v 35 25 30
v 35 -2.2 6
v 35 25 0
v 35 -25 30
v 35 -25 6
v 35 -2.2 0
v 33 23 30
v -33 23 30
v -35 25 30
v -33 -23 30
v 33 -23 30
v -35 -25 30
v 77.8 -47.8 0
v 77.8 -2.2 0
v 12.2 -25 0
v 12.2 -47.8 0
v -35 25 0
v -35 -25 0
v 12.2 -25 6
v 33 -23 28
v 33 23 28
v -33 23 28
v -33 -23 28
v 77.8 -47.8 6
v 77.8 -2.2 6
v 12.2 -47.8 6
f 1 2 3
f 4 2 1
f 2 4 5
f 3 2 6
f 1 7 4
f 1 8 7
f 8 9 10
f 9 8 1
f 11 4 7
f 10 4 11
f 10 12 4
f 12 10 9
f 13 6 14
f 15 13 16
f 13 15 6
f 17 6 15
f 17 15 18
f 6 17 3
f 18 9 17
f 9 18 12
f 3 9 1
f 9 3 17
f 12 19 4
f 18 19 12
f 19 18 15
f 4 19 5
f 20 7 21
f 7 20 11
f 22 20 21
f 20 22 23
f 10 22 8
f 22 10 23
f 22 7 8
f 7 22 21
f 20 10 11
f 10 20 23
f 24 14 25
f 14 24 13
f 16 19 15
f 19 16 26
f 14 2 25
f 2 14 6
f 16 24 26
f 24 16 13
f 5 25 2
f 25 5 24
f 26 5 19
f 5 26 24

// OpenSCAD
// Two-part enclosure for small electronics board
// Print orientation: box standing on bed, lid plate flat on bed

// ---------- Parameters ----------
box_x      = 70;    // box outer length (X)
box_y      = 50;    // box outer width (Y)
box_z      = 30;    // box outer height (Z)
box_wall   = 2;     // box wall thickness
box_floor  = 2;     // box floor thickness

lip_t      = 1.5;   // lip wall thickness
lip_h      = 4;     // lip height above plate
lip_x      = 65.6;  // lip outer length (X)
lip_y      = 45.6;  // lip outer width (Y)

eps        = 0.5;   // cutter overshoot
gap        = 10;    // gap between parts
$fn        = 64;

// ---------- Derived ----------
box_inner_x = box_x - 2*box_wall;
box_inner_y = box_y - 2*box_wall;
plate_t     = 2;    // lid plate thickness

// ---------- Model ----------
union() {
    // Box
    difference() {
        translate([-box_x/2, -box_y/2, 0])
            cube([box_x, box_y, box_z]);
        translate([-box_inner_x/2, -box_inner_y/2, box_z - box_wall])
            cube([box_inner_x, box_inner_y, box_wall + eps]);
    }

    // Lid
    translate([box_x/2 + gap, -box_y/2, 0]) {
        // Plate
        translate([-lip_x/2, -lip_y/2, 0])
            cube([lip_x, lip_y, plate_t]);
        // Lip
        translate([-lip_x/2, -lip_y/2, plate_t])
            cube([lip_x, lip_y, lip_h]);
    }
}
